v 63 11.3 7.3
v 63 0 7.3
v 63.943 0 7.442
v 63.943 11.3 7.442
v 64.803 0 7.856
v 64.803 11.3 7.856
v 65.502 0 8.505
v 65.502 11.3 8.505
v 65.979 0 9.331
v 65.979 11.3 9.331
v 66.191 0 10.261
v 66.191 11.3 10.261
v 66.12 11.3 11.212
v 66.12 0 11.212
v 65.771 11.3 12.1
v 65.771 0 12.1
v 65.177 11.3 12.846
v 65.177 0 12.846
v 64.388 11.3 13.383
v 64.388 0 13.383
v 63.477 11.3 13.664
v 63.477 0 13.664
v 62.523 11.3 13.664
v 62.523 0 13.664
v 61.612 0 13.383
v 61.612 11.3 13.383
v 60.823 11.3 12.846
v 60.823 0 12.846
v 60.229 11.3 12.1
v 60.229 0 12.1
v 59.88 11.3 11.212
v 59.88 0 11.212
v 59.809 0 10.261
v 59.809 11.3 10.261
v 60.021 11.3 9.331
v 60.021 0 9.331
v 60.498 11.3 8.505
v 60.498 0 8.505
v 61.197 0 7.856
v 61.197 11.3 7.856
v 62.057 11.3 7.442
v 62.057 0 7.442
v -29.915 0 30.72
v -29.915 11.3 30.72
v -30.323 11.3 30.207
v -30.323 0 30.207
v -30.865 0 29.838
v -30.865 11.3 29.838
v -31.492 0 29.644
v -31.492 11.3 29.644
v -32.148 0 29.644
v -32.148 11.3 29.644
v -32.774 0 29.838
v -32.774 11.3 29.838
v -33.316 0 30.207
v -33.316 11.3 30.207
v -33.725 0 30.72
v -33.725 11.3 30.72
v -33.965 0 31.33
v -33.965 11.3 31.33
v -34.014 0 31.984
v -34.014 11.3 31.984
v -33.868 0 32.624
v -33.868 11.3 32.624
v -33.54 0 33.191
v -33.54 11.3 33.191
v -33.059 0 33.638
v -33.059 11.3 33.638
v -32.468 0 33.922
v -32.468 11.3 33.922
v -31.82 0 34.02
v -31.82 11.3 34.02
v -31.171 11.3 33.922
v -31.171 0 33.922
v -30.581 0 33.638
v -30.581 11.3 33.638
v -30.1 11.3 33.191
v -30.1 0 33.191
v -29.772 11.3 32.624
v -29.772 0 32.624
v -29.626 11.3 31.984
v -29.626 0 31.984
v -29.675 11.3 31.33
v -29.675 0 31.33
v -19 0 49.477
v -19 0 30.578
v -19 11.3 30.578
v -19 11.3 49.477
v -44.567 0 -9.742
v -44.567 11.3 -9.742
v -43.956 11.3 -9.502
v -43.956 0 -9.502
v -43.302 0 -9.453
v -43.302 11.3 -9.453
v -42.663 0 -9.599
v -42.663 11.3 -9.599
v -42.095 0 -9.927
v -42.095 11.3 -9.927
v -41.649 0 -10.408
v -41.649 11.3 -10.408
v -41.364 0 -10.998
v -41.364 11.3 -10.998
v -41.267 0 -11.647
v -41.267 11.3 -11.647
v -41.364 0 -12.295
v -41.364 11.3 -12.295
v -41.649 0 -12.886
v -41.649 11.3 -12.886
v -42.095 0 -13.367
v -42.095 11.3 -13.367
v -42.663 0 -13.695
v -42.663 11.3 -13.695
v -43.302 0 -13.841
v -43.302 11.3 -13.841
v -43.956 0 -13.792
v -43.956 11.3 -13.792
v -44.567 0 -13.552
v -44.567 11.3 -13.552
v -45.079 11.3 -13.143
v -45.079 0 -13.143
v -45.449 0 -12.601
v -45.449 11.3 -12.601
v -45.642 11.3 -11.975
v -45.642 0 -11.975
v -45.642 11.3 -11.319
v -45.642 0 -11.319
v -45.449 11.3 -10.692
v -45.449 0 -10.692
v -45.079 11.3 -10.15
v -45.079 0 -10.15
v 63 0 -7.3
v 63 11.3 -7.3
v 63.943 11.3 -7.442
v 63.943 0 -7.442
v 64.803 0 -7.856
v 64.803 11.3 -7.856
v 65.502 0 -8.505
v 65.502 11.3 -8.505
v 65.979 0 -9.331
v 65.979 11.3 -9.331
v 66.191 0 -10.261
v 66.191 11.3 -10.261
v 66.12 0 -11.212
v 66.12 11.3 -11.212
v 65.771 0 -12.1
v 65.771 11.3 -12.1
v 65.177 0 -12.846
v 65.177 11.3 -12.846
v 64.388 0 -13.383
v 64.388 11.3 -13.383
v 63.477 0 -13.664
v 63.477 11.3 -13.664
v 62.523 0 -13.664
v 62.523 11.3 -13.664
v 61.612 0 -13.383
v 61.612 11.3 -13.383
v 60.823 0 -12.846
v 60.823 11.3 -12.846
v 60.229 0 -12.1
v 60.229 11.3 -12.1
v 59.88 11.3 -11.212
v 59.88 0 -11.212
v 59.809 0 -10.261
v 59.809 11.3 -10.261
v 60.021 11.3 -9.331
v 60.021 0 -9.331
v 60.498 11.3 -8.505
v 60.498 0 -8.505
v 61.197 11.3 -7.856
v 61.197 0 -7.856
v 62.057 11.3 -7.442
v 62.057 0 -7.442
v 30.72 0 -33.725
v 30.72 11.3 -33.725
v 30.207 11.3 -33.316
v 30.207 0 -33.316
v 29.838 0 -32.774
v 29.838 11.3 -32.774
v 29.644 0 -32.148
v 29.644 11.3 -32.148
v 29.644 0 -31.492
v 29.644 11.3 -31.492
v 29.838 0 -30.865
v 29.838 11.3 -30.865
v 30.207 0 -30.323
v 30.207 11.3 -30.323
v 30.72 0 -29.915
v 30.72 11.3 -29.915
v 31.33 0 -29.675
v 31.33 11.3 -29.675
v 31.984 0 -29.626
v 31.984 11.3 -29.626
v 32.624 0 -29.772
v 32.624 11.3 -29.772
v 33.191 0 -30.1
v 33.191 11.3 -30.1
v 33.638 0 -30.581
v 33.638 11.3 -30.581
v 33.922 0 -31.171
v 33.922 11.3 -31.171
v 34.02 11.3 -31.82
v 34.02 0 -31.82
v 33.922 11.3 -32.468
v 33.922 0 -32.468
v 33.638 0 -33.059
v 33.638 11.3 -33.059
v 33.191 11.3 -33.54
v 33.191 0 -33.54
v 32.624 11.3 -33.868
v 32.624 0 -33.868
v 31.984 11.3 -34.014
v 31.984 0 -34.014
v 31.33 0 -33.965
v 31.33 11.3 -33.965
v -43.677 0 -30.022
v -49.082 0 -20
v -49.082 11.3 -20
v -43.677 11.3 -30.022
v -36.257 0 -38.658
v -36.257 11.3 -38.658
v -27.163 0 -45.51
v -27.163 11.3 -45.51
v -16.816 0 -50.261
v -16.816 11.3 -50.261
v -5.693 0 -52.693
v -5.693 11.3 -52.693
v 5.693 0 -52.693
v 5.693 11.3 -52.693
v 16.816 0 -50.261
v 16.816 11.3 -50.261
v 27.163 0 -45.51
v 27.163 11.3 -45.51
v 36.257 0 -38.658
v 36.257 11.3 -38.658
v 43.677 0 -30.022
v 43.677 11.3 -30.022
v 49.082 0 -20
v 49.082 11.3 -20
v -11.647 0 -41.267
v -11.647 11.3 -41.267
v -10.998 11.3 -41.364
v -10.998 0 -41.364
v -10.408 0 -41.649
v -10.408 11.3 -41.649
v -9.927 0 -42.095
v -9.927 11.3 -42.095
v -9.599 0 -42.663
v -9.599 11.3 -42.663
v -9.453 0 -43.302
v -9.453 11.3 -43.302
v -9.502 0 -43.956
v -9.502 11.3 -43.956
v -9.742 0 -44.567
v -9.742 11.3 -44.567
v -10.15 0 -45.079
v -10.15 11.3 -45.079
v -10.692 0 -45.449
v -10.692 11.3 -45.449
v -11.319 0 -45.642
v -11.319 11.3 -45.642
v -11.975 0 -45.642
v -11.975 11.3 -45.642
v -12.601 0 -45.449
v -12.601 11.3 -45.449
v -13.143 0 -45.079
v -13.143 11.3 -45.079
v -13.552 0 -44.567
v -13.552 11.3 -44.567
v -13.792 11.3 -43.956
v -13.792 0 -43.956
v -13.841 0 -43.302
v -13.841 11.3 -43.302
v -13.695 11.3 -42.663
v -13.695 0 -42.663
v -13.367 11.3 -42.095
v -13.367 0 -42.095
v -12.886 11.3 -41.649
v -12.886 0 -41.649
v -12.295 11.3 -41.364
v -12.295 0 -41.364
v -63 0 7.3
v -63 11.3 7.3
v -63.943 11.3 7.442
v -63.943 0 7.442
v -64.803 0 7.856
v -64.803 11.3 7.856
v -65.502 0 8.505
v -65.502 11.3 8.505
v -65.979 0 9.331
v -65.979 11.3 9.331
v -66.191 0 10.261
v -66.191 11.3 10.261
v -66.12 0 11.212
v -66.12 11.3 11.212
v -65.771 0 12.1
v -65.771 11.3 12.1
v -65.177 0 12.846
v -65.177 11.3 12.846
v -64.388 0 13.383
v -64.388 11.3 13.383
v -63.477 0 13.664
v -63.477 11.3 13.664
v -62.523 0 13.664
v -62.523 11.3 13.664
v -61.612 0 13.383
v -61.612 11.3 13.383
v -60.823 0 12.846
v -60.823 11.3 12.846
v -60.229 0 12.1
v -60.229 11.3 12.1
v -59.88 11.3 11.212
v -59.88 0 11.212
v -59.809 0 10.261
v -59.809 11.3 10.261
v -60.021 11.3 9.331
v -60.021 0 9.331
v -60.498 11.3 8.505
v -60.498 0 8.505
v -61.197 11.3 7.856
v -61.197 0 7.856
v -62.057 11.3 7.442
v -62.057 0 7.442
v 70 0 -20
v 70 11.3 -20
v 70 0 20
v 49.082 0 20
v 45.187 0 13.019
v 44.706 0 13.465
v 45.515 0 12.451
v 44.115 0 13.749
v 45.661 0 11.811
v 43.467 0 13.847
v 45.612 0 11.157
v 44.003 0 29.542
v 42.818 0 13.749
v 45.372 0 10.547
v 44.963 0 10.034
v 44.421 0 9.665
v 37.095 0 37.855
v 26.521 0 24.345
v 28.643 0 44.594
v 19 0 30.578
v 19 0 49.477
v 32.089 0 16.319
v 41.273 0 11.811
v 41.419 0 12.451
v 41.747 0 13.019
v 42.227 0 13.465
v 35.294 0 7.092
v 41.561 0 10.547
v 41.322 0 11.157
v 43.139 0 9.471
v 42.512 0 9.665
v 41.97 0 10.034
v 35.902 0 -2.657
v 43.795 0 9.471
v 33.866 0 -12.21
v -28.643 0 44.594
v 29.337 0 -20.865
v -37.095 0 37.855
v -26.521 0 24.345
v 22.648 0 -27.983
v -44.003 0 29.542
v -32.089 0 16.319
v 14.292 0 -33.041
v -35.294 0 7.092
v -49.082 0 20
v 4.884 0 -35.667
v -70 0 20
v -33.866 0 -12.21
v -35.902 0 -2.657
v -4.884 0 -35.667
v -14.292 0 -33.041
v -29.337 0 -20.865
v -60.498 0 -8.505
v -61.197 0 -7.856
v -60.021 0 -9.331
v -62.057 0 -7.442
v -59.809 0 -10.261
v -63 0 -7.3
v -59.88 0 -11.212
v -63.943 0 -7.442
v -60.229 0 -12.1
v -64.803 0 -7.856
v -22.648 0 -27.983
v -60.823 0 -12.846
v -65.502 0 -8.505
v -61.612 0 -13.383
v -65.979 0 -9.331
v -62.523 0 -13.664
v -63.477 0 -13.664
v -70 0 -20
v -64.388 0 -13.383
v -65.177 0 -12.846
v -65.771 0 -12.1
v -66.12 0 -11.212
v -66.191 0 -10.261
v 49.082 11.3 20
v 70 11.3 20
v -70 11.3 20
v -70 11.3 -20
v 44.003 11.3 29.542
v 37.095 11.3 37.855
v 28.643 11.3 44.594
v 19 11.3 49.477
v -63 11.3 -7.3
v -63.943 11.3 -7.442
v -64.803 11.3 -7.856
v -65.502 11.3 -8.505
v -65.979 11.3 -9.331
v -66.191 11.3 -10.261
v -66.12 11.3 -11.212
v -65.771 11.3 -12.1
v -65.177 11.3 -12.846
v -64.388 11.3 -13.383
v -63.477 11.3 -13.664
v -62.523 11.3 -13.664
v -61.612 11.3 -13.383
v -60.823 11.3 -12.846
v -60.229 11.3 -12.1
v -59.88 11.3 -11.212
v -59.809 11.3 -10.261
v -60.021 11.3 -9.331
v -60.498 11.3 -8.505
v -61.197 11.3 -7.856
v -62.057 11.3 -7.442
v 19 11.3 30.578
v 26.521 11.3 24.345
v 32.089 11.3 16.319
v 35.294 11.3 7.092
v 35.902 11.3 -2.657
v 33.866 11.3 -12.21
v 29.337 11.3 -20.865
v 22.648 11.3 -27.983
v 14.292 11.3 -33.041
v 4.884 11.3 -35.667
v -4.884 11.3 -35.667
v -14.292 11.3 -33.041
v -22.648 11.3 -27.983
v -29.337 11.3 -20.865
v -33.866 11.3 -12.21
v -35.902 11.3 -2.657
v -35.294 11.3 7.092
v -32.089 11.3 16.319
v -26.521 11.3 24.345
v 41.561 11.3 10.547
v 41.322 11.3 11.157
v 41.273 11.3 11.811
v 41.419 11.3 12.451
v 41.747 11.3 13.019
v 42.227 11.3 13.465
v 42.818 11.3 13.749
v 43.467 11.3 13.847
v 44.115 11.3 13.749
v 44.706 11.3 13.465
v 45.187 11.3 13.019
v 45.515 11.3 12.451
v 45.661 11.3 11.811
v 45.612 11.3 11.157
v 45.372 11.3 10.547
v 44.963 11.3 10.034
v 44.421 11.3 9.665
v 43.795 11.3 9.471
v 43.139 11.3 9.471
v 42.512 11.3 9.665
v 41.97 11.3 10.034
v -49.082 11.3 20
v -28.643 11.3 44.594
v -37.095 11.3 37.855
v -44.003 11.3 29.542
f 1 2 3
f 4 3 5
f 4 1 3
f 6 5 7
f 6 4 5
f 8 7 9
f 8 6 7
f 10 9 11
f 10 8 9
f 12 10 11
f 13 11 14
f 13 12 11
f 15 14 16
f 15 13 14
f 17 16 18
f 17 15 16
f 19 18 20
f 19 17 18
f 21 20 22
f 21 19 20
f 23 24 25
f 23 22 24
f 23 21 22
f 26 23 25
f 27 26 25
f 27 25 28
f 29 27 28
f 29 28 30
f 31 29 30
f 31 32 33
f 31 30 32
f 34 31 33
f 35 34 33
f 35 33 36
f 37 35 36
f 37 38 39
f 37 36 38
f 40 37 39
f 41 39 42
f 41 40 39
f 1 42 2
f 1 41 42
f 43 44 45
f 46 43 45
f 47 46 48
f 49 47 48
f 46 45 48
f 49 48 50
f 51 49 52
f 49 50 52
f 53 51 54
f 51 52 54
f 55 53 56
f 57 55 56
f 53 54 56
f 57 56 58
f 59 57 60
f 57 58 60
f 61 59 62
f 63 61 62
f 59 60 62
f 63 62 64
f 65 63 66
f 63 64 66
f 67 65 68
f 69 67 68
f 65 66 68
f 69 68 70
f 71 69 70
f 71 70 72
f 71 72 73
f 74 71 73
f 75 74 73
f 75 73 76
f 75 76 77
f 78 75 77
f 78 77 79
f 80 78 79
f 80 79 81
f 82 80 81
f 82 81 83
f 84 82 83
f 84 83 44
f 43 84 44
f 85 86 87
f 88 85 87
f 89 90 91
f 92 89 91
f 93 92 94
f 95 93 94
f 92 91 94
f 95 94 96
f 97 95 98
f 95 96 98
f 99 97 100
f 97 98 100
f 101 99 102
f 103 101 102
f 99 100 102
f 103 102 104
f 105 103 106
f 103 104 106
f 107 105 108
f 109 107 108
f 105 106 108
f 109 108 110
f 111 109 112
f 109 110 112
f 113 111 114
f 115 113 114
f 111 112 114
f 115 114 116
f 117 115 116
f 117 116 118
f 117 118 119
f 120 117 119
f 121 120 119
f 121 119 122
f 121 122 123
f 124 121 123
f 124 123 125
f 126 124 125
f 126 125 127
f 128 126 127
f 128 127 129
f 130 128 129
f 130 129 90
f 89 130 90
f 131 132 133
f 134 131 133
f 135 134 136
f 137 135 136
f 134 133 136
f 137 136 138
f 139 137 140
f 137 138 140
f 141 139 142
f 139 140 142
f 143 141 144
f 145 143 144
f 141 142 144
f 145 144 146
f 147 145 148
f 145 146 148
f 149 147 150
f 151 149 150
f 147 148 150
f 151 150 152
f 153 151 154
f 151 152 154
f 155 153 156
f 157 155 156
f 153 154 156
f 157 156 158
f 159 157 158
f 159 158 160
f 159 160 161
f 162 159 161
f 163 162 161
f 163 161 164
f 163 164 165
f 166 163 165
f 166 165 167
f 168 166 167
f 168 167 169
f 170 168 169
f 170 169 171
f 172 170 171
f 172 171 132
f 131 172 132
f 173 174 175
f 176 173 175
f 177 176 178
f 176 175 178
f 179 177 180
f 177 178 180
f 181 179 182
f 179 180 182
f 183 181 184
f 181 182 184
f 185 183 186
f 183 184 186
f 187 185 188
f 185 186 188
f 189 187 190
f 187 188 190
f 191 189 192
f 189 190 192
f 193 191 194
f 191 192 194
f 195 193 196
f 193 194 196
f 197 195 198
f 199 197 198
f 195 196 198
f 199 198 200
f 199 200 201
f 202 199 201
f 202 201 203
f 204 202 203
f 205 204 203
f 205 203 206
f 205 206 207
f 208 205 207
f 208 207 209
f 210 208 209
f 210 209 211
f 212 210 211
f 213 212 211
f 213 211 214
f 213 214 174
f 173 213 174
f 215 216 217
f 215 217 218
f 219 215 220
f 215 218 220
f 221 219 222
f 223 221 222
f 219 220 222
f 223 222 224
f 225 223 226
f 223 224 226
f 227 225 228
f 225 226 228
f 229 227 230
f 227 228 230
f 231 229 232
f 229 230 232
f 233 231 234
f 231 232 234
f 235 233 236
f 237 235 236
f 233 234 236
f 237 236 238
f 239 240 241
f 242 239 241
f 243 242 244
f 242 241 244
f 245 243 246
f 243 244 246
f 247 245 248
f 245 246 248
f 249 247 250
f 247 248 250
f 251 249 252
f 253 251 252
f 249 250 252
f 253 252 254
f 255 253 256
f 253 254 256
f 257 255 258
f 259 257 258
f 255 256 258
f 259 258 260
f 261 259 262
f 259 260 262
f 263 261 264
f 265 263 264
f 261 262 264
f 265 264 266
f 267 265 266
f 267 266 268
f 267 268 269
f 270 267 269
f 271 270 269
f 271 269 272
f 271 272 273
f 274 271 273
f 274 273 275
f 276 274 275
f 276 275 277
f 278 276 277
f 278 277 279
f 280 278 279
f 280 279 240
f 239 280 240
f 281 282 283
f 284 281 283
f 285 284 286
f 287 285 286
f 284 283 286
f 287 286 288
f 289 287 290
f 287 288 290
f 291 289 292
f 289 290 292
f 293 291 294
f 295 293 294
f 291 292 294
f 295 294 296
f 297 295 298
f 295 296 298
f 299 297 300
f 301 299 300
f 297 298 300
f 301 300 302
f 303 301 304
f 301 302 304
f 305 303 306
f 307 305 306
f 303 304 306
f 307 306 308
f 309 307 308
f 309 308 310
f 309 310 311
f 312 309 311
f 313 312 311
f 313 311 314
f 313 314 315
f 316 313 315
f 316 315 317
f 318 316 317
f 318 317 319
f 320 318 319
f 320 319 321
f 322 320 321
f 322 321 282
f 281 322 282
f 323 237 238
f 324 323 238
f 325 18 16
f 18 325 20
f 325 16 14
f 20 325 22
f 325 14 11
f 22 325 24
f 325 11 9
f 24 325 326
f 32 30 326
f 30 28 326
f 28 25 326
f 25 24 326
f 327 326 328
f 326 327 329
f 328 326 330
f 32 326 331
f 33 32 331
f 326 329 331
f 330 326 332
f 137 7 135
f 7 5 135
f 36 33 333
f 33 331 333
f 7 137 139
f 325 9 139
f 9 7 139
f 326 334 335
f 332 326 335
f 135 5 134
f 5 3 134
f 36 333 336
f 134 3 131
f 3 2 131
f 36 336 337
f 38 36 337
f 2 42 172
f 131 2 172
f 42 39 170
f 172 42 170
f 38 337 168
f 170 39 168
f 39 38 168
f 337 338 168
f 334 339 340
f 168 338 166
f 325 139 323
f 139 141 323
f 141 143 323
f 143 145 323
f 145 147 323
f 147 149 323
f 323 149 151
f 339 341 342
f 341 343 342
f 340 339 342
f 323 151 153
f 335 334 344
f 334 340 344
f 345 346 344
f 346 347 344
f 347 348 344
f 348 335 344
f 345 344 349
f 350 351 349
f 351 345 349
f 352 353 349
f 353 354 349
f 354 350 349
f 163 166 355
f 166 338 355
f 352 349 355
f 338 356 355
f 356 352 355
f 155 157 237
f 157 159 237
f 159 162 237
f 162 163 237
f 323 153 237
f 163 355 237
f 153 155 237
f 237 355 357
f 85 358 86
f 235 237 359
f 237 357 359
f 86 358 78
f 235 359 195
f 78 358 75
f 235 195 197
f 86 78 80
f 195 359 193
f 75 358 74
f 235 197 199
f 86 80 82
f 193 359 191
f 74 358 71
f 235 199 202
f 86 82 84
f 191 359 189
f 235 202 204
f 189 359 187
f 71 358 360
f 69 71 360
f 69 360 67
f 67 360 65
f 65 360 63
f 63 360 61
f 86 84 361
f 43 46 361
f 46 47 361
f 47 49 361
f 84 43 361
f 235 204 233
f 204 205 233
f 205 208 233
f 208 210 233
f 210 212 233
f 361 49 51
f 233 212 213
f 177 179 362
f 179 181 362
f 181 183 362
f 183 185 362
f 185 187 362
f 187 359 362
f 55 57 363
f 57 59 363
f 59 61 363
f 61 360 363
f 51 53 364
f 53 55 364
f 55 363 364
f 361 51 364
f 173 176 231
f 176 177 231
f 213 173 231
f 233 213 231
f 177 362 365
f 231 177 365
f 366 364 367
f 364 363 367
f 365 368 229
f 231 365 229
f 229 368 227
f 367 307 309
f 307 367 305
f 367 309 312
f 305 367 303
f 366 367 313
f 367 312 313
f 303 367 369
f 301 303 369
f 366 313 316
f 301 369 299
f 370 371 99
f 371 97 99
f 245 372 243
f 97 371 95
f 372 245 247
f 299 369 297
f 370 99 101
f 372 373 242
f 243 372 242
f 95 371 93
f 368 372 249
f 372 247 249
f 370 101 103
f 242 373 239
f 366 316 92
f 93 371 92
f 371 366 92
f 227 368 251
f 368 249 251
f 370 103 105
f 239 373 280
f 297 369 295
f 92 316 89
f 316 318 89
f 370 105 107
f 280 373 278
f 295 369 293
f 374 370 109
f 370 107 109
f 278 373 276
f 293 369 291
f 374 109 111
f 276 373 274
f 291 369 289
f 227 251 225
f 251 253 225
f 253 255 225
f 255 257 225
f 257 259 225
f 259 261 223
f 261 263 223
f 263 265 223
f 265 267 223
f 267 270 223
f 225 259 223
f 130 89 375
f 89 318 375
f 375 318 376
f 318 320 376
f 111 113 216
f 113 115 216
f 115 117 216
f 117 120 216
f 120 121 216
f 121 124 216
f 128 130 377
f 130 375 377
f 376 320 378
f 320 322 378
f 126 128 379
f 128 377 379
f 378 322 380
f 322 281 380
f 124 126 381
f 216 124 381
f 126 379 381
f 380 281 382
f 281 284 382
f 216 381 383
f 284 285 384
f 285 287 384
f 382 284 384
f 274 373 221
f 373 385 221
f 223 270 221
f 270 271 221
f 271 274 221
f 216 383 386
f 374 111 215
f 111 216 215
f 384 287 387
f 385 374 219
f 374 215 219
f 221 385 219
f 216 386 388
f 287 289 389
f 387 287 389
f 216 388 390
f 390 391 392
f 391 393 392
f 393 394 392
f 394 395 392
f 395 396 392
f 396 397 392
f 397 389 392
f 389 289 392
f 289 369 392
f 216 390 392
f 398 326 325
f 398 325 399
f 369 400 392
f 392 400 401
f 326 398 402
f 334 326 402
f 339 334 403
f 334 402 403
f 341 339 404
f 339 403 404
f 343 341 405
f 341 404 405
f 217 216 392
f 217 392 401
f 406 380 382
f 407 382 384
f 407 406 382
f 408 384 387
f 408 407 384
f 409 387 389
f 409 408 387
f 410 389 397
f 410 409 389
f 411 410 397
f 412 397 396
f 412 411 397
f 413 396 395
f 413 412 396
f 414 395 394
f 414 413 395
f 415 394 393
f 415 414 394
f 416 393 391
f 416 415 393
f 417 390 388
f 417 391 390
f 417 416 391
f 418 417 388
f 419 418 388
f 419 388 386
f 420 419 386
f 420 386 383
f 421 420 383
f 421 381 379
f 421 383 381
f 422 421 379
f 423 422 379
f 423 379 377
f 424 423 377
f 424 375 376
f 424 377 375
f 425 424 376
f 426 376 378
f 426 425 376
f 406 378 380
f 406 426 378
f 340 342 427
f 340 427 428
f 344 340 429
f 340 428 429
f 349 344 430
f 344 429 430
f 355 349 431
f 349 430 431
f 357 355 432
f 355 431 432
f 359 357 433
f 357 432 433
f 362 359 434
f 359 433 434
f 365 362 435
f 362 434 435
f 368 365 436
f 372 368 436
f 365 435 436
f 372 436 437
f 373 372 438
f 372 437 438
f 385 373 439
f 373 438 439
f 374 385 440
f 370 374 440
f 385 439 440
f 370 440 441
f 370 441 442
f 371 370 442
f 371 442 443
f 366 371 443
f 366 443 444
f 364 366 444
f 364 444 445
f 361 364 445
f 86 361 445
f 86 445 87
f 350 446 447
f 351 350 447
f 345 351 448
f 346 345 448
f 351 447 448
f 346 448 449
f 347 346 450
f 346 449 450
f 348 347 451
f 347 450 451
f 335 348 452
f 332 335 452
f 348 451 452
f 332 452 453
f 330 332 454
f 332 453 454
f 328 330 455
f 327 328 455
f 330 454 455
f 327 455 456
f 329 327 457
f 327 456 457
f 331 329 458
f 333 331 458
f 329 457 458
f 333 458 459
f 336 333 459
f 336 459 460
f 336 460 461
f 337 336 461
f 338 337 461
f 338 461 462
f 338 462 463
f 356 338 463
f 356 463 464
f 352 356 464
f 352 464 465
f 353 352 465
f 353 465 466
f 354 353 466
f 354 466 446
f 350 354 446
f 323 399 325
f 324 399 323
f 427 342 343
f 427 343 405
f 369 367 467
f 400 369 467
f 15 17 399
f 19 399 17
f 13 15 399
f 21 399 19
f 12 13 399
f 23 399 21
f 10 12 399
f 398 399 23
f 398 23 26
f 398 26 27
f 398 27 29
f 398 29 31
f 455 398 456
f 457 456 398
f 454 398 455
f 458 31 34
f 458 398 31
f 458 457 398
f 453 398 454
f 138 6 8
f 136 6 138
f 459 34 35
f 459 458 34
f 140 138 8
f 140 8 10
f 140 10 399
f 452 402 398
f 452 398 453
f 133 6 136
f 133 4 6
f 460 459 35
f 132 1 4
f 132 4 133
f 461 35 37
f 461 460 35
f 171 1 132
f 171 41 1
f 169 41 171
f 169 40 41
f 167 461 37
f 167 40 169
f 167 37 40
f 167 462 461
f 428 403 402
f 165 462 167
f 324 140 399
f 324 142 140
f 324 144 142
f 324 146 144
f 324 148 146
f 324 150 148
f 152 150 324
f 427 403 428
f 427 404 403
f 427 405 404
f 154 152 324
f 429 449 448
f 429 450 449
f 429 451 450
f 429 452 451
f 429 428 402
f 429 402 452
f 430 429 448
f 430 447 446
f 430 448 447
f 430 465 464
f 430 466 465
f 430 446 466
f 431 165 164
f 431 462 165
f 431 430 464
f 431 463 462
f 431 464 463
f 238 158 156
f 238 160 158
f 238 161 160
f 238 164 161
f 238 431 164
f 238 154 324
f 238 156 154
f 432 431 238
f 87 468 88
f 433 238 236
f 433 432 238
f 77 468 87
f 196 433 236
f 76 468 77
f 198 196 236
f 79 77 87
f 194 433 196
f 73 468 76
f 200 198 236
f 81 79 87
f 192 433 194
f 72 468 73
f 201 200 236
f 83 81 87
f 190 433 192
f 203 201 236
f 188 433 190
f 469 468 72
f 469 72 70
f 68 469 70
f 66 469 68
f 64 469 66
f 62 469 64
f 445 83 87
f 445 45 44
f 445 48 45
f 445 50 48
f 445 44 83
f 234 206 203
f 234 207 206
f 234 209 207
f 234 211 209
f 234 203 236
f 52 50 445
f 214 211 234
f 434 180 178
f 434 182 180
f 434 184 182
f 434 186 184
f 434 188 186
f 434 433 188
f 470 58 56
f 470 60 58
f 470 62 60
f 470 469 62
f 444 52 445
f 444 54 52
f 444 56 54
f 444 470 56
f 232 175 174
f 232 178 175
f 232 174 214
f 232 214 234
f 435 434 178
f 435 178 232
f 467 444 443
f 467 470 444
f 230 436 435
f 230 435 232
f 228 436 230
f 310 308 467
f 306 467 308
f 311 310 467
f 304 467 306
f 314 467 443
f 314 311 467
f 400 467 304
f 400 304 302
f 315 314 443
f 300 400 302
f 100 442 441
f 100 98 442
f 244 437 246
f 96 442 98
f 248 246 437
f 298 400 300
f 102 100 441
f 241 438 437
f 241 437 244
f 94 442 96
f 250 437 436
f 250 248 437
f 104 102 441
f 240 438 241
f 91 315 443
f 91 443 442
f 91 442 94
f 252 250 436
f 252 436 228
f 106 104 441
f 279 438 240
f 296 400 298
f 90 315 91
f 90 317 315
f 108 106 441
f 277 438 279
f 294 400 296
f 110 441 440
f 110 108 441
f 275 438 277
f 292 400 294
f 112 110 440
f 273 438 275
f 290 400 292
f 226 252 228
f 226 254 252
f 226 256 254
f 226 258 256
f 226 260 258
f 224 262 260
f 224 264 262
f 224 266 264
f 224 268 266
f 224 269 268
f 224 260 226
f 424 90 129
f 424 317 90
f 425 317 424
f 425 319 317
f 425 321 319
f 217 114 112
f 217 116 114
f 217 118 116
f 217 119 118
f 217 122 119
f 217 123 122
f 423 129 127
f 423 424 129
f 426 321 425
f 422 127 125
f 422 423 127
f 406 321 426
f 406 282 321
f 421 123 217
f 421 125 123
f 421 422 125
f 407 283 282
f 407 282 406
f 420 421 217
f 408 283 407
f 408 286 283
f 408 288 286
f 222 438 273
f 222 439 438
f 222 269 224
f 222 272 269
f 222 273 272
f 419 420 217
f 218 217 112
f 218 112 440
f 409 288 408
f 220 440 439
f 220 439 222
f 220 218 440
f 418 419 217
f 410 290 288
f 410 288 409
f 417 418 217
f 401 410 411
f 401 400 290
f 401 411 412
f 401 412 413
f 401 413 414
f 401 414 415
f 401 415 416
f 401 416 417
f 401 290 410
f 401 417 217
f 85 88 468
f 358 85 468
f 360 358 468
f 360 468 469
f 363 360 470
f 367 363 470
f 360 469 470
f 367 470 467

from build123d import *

# Parameters (mm, degrees)
SKETCH1_W                                  = 53
SKETCH1_H                                  = 11.3
SKETCH2_R                                  = 36
CUT_EXTRUDE1_DEPTH                         = 11.3
SKETCH3_W                                  = 38
SKETCH3_H                                  = 11.3
CUT_EXTRUDE2_DEPTH                         = 41.3
SKETCH5_R                                  = 2.2
CUT_EXTRUDE3_DEPTH                         = 76.800329815
CIRPATTERN1_COUNT                          = 3
BOSS_EXTRUDE1_START                        = -5
SKETCH6_W                                  = 40
SKETCH6_H                                  = 11.3
BOSS_EXTRUDE1_DEPTH                        = 22
SKETCH7_R                                  = 3.2
CUT_EXTRUDE4_DEPTH                         = 89.525081192
MIRROR2_AT_THE_SECOND_PLANE_COPY_1_SKETC_R = 3.2
MIRROR2_AT_THE_SECOND_PLANE_COPY_1_DEPTH   = 89.525081192


with BuildPart() as part:
    # Sketch1 → Revolve1 (revolve)
    with BuildSketch(Plane(origin=(0, 0, 0), x_dir=(0, 0, -1), z_dir=(1, 0, 0)), mode=Mode.PRIVATE) as revolve1_sk:
        with Locations((26.5, 5.65)):
            Rectangle(SKETCH1_W, SKETCH1_H)
    revolve(revolve1_sk.sketch.rotate(Axis((0, 28.592836715, 0), (0, -1, 0)), 180), axis=Axis((0, 28.592836715, 0), (0, -1, 0)))

    # Sketch2 → Cut-Extrude1 (cut)
    with BuildSketch(Plane(origin=(0, 11.3, 0), x_dir=(1, 0, 0), z_dir=(0, 1, 0))):
        with Locations(Location((0, 0, 0), (0, 0, 270))):
            Circle(SKETCH2_R)
    extrude(amount=-CUT_EXTRUDE1_DEPTH, mode=Mode.SUBTRACT)

    # Sketch3 → Cut-Extrude2 (cut)
    with BuildSketch(Plane.XY.offset(53)):
        with Locations((0, 5.65)):
            Rectangle(SKETCH3_W, SKETCH3_H)
    extrude(amount=-CUT_EXTRUDE2_DEPTH, mode=Mode.SUBTRACT)

    # Sketch5 → Cut-Extrude3 (cut, through all)
    with BuildSketch(Plane(origin=(0, 11.3, 0), x_dir=(1, 0, 0), z_dir=(0, 1, 0))):
        with Locations((11.64685703, -43.466662183)):
            Circle(SKETCH5_R)
        with Locations(Location((-11.64685703, 43.466662183, 0), (0, 0, 270))):
            Circle(SKETCH5_R)
    cut_extrude3 = extrude(amount=-CUT_EXTRUDE3_DEPTH, mode=Mode.SUBTRACT)

    # CirPattern1: Cut-Extrude3 ×3 about axis
    cirpattern1_axis = Axis((0, 0, 0), (0, 1, 0))
    for i in range(1, CIRPATTERN1_COUNT):
        add(cut_extrude3.rotate(cirpattern1_axis, i * 360 / CIRPATTERN1_COUNT), mode=Mode.SUBTRACT)

    # Sketch6 → Boss-Extrude1 (add)
    with BuildSketch(Plane(origin=(53, 0, 0), x_dir=(0, 0, -1), z_dir=(1, 0, 0)).offset(BOSS_EXTRUDE1_START)):
        with Locations((0, 5.65)):
            Rectangle(SKETCH6_W, SKETCH6_H)
    boss_extrude1 = extrude(amount=BOSS_EXTRUDE1_DEPTH)

    # Mirror1: Boss-Extrude1 across plane
    add(boss_extrude1.mirror(Plane(origin=(0, 0, 0), x_dir=(0, 0, 1), z_dir=(1, 0, 0))))

    # Sketch7 → Cut-Extrude4 (cut, through all)
    with BuildSketch(Plane(origin=(0, 11.3, 0), x_dir=(1, 0, 0), z_dir=(0, 1, 0))):
        with Locations(Location((63, 10.5, 0), (0, 0, 270))):
            Circle(SKETCH7_R)
    cut_extrude4 = extrude(amount=-CUT_EXTRUDE4_DEPTH, mode=Mode.SUBTRACT)

    # Mirror2: Cut-Extrude4 across plane
    add(cut_extrude4.mirror(Plane(origin=(0, 0, 0), x_dir=(0, 0, 1), z_dir=(1, 0, 0))), mode=Mode.SUBTRACT)

    # Mirror2 at the second plane: Cut-Extrude4 across plane
    add(cut_extrude4.mirror(Plane.XY), mode=Mode.SUBTRACT)

    # Mirror2 at the second plane copy 1 sketc → Mirror2 at the second plane copy 1 (cut, through all)
    with BuildSketch(Plane(origin=(0, 11.3, 0), x_dir=(-1, 0, 0), z_dir=(0, 1, 0))):
        with Locations(Location((63, 10.5, 0), (0, 0, 270))):
            Circle(MIRROR2_AT_THE_SECOND_PLANE_COPY_1_SKETC_R)
    extrude(amount=-MIRROR2_AT_THE_SECOND_PLANE_COPY_1_DEPTH, mode=Mode.SUBTRACT)


solid = part.part
